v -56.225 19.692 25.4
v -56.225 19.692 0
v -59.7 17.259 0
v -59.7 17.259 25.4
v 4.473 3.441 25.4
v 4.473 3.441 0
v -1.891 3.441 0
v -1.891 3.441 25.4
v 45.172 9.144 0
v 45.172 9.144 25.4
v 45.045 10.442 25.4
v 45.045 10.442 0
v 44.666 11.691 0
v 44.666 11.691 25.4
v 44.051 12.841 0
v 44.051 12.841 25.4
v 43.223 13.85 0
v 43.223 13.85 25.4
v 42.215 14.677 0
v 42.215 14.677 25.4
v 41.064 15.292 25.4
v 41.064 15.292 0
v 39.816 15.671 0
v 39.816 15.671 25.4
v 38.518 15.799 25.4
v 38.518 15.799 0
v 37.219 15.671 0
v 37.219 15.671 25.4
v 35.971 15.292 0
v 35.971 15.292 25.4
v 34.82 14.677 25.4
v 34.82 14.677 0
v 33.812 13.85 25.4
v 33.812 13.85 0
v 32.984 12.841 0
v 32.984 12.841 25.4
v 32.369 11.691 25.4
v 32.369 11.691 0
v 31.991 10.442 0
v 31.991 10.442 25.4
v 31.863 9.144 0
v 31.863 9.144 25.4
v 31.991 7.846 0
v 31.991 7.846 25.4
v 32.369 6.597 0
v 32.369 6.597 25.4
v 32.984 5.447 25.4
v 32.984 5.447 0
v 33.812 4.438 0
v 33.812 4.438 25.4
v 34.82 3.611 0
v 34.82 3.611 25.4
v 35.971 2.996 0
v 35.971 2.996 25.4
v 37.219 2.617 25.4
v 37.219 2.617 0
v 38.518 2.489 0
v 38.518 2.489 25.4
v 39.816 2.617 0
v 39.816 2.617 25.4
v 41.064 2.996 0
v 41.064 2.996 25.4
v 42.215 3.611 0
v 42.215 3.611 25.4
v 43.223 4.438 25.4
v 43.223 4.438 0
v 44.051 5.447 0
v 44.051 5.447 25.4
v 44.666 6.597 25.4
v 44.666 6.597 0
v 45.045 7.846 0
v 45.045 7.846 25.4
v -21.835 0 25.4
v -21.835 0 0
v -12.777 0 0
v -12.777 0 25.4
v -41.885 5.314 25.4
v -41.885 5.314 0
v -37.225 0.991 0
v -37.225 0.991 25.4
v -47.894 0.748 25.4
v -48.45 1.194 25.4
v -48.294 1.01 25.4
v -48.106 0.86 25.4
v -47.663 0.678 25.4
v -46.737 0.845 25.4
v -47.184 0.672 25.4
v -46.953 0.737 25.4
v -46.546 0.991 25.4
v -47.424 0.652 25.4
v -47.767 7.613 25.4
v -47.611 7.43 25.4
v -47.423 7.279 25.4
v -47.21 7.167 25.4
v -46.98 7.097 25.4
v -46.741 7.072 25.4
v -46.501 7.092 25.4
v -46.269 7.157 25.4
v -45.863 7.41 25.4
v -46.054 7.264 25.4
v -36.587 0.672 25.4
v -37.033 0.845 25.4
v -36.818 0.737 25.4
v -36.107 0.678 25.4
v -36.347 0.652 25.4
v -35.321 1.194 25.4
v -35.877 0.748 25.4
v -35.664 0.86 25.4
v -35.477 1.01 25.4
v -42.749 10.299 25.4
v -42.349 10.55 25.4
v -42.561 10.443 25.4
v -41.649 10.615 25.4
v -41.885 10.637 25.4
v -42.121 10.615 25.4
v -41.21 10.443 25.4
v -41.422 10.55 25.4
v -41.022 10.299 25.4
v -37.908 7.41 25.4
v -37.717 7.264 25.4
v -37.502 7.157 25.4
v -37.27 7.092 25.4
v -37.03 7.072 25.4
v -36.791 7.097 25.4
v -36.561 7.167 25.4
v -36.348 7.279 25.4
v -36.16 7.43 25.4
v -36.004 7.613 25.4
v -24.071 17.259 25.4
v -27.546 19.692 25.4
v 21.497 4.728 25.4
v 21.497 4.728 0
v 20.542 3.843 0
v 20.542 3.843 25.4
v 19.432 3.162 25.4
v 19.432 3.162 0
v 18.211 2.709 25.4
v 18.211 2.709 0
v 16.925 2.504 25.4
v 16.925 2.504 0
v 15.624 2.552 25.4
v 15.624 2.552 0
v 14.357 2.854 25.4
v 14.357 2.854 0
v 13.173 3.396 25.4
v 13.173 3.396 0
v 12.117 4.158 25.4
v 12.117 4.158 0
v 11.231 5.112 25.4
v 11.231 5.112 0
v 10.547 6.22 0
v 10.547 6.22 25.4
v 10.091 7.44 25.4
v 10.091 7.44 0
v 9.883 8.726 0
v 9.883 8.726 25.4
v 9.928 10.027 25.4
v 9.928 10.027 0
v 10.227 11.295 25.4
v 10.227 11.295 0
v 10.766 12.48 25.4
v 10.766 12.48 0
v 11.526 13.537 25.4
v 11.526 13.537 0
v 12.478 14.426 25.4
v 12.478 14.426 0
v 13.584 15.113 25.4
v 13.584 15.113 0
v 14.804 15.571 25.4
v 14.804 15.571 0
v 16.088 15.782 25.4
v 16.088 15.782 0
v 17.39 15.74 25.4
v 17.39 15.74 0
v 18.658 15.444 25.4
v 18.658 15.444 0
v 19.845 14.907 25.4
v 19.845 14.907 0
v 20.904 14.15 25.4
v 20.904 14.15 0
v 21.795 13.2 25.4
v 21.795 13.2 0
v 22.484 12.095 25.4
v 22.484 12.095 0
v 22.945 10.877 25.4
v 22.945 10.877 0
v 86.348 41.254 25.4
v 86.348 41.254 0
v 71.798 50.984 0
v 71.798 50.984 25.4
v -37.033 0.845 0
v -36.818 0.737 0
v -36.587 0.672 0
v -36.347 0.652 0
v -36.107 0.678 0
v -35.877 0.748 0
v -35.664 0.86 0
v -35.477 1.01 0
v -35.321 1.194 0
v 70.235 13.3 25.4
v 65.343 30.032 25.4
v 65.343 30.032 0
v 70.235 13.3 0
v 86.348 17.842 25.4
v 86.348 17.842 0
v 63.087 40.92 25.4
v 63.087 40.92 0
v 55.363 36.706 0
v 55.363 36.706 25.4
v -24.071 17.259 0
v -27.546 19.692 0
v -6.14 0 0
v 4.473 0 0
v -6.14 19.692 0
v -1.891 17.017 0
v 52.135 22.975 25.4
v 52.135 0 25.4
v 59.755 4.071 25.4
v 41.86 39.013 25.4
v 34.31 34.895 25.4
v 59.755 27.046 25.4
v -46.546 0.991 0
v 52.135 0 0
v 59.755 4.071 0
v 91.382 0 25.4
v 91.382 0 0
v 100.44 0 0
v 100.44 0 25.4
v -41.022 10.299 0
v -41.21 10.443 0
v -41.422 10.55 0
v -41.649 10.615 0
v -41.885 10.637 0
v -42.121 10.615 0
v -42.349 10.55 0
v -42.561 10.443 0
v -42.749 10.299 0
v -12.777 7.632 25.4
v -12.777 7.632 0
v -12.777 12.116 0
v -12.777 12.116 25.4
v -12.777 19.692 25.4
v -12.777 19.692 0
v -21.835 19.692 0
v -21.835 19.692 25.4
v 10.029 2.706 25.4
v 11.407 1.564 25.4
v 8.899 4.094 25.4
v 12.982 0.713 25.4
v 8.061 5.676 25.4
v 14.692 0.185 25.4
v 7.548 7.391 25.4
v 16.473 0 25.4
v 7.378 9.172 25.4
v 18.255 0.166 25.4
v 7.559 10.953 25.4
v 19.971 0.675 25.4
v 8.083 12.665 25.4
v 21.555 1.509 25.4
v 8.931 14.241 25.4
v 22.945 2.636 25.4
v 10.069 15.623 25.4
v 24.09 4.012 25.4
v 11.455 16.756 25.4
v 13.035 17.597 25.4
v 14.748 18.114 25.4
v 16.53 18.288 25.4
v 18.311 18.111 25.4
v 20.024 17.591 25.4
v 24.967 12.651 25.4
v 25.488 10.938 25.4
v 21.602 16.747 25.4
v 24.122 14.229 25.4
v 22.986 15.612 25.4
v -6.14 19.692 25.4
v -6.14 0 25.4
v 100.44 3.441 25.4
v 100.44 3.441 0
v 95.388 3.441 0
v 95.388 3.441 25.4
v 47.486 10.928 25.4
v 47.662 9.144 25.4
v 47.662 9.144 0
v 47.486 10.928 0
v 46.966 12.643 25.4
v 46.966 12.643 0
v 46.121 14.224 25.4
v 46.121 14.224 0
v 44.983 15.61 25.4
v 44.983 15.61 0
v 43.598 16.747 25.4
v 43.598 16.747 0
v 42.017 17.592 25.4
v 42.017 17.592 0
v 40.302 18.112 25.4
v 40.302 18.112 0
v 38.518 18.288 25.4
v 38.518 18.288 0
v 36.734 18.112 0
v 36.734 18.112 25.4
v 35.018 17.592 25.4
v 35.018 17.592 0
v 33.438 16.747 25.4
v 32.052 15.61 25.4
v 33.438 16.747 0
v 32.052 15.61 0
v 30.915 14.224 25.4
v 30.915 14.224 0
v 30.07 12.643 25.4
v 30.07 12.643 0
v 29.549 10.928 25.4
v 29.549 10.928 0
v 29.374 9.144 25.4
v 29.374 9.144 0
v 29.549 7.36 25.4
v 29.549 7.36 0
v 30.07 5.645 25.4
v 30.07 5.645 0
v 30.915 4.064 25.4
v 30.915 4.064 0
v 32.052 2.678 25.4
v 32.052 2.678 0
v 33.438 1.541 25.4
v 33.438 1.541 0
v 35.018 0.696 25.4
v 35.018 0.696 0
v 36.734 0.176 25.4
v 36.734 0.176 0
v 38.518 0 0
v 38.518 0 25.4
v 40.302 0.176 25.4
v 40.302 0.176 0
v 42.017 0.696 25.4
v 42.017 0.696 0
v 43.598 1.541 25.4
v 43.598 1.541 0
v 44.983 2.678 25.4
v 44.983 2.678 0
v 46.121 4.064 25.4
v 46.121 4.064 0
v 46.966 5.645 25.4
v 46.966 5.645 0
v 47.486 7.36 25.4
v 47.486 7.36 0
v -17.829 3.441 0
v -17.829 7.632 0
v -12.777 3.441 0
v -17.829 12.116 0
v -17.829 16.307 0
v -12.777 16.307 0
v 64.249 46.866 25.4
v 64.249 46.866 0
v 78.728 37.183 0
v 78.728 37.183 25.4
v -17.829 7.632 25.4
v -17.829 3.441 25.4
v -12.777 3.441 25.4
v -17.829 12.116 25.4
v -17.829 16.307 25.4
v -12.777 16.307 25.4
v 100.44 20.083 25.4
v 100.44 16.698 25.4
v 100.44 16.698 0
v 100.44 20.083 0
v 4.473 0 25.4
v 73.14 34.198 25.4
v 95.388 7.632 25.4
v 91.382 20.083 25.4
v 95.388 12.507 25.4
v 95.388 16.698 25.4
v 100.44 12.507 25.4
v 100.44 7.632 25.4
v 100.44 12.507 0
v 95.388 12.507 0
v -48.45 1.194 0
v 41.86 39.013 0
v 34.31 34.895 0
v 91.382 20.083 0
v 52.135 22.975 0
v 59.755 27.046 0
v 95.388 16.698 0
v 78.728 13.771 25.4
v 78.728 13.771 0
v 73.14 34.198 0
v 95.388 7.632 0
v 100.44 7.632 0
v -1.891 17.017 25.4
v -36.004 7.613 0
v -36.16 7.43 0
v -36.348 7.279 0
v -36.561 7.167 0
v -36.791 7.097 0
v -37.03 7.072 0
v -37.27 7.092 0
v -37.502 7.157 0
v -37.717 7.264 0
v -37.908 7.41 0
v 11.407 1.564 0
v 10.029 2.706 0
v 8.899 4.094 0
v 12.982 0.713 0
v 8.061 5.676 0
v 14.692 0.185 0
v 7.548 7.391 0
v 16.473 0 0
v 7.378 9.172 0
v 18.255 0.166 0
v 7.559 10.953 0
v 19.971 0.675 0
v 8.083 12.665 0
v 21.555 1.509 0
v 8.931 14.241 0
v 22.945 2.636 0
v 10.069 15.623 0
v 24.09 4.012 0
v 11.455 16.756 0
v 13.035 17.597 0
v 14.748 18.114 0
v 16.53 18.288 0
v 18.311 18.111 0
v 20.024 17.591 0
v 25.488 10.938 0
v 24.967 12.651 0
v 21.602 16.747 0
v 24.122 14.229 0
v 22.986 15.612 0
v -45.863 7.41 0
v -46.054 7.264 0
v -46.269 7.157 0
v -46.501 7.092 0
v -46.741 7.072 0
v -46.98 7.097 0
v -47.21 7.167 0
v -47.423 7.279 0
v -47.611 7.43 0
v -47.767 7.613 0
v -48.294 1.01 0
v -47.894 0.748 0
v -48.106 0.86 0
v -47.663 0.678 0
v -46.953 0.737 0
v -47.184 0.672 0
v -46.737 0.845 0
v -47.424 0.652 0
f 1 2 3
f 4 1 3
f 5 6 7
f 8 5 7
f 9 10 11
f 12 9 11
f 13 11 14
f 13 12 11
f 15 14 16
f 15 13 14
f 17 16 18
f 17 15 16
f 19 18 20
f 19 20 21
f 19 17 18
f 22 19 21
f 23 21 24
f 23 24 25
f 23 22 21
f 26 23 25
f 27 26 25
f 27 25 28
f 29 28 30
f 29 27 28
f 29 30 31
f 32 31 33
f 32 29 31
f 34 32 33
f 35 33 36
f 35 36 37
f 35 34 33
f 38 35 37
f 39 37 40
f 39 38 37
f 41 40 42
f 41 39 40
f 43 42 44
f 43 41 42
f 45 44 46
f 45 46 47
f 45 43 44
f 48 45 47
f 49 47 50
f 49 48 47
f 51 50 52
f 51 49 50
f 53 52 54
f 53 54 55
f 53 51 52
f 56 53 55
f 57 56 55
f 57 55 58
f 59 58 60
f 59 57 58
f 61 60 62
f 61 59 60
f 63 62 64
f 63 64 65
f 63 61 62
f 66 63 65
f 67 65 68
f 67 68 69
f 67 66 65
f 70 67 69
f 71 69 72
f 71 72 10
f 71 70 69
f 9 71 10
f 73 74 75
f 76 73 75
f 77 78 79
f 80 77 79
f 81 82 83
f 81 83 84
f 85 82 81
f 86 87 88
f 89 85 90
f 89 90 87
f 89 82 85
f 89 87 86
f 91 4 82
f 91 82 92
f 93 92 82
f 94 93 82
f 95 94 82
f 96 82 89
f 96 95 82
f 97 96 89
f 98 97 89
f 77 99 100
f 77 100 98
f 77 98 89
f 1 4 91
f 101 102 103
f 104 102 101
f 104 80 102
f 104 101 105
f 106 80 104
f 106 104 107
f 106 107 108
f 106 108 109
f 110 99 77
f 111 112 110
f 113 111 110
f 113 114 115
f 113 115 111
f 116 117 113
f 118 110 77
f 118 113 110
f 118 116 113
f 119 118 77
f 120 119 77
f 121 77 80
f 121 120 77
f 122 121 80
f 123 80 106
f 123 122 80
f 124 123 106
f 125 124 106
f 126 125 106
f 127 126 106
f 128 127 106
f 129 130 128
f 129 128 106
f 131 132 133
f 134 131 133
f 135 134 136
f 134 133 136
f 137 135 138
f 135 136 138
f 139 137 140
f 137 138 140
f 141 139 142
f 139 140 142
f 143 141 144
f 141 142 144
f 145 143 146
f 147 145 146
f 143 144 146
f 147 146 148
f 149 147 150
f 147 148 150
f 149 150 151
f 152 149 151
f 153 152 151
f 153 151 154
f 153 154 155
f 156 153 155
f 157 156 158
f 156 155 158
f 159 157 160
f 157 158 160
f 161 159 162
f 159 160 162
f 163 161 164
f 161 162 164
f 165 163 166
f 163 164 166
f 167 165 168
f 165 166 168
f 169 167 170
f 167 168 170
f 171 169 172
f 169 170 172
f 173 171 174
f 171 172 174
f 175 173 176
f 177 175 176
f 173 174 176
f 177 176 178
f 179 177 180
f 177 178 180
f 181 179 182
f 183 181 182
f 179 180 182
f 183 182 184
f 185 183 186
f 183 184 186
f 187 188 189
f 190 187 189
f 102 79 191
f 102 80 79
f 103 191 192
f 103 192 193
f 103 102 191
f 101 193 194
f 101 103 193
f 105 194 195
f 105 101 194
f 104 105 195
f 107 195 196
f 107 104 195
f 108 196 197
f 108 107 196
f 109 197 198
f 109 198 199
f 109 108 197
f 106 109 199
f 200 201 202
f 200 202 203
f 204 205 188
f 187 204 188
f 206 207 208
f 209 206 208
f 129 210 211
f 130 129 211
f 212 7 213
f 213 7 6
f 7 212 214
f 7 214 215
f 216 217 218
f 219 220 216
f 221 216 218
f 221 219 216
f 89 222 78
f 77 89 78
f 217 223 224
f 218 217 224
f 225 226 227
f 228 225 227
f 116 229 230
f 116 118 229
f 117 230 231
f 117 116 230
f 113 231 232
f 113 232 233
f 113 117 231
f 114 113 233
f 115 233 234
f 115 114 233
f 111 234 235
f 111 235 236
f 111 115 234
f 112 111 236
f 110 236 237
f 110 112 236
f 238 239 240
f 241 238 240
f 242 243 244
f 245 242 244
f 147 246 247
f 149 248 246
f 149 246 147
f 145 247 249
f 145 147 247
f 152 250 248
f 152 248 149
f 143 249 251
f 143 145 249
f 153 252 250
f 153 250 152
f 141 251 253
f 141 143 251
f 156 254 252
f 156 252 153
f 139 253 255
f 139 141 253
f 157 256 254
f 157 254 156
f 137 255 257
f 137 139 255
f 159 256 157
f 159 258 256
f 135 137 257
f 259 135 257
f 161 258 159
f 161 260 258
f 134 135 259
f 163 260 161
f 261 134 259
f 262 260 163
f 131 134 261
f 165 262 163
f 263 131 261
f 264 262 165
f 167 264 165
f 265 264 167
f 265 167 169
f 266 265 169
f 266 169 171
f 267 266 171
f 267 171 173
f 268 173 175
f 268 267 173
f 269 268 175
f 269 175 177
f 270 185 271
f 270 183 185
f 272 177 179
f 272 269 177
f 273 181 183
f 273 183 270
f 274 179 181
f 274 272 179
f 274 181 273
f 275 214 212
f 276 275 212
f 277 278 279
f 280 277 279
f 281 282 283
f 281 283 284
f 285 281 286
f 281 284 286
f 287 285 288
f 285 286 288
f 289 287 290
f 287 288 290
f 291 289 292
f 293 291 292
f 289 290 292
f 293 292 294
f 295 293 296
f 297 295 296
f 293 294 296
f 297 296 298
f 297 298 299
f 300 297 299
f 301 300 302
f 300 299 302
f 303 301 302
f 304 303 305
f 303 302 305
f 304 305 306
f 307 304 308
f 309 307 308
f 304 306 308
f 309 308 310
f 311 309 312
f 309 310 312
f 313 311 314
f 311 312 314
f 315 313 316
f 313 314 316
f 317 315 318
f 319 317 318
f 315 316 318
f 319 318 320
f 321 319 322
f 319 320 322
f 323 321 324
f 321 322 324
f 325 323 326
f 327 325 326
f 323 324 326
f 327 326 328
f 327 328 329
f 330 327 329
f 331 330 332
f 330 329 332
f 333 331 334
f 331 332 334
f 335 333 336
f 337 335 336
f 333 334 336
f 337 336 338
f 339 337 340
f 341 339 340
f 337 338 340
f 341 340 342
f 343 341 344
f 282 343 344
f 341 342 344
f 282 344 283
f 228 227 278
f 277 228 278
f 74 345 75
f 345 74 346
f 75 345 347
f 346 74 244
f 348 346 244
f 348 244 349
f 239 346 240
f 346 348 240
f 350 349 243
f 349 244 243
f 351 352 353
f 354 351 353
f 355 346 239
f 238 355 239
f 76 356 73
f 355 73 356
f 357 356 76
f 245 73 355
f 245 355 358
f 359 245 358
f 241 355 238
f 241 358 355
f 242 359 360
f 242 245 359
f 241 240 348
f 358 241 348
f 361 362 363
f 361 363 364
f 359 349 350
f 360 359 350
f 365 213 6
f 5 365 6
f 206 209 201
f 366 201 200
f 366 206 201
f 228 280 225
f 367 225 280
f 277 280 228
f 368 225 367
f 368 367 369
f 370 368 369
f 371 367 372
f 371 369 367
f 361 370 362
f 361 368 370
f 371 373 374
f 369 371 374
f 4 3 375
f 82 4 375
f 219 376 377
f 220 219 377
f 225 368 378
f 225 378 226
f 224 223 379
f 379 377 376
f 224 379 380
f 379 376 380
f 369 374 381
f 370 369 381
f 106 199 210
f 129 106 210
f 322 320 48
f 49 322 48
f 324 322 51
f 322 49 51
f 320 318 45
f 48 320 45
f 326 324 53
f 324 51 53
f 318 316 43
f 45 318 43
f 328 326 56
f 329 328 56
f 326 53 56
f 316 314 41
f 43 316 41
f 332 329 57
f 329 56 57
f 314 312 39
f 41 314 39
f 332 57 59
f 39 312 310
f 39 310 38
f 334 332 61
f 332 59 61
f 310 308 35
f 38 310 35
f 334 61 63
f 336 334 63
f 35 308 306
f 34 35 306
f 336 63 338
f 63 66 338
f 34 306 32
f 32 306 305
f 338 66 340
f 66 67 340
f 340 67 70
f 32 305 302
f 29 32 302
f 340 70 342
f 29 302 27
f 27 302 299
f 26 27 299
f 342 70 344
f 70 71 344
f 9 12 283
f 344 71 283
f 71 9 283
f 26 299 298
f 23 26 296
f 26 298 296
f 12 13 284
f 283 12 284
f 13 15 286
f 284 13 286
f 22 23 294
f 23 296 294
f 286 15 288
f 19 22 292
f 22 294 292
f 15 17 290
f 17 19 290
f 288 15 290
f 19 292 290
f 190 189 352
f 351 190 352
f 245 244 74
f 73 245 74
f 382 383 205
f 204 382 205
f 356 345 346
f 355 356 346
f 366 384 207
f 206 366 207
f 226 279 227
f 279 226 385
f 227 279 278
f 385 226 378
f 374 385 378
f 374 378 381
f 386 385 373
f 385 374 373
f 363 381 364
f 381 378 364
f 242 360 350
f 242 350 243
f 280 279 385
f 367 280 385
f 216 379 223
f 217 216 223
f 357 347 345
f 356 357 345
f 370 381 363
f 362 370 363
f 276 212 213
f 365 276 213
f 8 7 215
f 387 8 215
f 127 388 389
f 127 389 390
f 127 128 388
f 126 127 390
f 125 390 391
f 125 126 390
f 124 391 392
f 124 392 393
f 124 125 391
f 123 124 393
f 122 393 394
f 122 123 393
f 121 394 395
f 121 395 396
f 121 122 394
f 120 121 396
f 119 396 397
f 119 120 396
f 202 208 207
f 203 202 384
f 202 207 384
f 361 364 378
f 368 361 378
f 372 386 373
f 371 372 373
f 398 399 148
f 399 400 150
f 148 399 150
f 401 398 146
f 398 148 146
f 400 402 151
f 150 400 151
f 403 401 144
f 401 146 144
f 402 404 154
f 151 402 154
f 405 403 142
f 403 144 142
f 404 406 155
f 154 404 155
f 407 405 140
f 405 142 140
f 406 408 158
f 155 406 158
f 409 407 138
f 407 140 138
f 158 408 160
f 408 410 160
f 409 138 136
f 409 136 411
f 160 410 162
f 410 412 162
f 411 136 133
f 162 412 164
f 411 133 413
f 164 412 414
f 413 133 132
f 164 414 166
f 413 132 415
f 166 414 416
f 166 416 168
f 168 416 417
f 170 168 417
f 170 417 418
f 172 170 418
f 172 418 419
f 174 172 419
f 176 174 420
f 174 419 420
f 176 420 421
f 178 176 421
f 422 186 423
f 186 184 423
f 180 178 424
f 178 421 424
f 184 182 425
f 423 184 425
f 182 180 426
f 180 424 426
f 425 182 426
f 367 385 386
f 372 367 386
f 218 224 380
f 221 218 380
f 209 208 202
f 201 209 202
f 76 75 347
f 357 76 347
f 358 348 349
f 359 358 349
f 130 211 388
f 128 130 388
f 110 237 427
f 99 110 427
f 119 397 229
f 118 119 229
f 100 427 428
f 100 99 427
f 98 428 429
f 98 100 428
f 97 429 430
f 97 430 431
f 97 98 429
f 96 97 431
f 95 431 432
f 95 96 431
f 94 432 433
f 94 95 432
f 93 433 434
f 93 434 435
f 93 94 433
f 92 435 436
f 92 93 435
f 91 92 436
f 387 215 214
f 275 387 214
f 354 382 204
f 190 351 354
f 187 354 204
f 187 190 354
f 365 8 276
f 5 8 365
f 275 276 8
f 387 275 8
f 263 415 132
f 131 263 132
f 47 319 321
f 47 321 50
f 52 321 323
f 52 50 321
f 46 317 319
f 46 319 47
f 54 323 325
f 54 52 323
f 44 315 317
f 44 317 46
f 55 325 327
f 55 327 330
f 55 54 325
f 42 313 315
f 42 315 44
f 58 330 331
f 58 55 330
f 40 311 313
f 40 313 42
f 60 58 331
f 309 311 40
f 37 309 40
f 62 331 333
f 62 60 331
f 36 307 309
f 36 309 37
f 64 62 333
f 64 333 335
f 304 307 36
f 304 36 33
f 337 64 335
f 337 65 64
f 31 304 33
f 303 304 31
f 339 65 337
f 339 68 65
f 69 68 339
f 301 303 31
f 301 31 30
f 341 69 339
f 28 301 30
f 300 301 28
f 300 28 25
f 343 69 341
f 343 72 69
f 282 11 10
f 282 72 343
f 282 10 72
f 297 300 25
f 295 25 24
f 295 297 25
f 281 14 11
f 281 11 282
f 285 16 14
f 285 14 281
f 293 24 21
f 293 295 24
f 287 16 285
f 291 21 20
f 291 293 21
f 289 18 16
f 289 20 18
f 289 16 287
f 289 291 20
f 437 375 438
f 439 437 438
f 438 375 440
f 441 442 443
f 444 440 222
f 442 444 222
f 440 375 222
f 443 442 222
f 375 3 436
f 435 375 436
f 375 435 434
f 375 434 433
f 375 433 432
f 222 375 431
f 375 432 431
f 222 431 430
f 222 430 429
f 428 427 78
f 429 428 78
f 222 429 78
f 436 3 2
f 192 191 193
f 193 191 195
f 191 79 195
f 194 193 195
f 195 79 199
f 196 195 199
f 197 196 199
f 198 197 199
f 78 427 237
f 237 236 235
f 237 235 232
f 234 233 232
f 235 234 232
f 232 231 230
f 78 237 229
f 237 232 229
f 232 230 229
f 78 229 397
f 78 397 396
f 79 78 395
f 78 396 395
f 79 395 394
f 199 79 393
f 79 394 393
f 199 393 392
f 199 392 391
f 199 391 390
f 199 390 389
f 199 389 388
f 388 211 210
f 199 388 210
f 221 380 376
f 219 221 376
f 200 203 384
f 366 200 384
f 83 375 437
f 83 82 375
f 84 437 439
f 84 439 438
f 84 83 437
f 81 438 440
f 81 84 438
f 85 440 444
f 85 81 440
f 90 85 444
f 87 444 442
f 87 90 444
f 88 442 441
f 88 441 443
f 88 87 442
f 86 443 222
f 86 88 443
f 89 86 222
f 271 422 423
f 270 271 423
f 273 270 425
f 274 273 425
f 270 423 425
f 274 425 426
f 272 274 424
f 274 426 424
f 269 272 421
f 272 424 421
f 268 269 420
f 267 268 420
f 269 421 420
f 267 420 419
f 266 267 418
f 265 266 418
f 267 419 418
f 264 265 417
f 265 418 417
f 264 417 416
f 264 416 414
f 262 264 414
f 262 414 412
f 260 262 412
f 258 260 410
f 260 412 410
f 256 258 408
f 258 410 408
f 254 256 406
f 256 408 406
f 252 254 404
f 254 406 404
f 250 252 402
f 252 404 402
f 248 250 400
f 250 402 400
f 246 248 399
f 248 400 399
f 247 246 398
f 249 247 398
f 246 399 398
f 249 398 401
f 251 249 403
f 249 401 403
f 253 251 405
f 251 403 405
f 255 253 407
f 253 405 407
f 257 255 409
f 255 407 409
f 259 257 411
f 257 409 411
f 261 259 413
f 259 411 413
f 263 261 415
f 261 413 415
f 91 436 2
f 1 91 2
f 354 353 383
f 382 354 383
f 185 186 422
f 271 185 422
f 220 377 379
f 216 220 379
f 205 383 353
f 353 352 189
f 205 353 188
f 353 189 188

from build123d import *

# Parameters (mm, degrees)
F0_R     = 9.144
F0_R_2   = 6.6548
F1_DEPTH = 25.4
F2_R     = 1.27


with BuildPart() as f1:
    # F0 (on Top) → F1 (new body)
    with BuildSketch(Plane.XY):
        Polygon((-56.225007, 19.692399), (-59.699686, 17.259402), (-47.614523, 0), (-41.885428, 5.31409), (-36.156334, 0), (-24.07117, 17.259402), (-27.545849, 19.692399), (-36.839665, 6.419454), (-41.885428, 11.099711), (-46.931191, 6.419454), align=None)
        Polygon((-12.777022, 19.692399), (-21.835072, 19.692399), (-21.835072, 0), (-12.777022, 0), (-12.777022, 3.441353), (-17.829043, 3.441353), (-17.829043, 7.632353), (-12.777022, 7.632353), (-12.777022, 12.116344), (-17.829043, 12.116344), (-17.829043, 16.307344), (-12.777022, 16.307344), align=None)
        Polygon((-1.890715, 17.016986), (-6.140463, 19.692399), (-6.140463, 0), (4.472522, 0), (4.472522, 3.441353), (-1.890715, 3.441353), align=None)
        with BuildLine():
            Line((22.944822, 10.877335), (25.488318, 10.938227))
            ThreePointArc((25.488318, 10.938227), (7.558864, 10.953297), (24.090238, 4.012171))
            Line((24.090238, 4.012171), (21.497463, 4.727933))
            ThreePointArc((21.497463, 4.727933), (10.046496, 10.668131), (22.944822, 10.877335))
        make_face()
        with Locations((38.51769, 9.144)):
            Circle(F0_R)
        with Locations((38.51769, 9.144)):
            Circle(F0_R_2, mode=Mode.SUBTRACT)
        Polygon((52.135022, 22.975057), (52.135022, 0), (59.755022, 4.07117), (59.755022, 27.046227), (41.859602, 39.013105), (34.310357, 34.89462), align=None)
        Polygon((63.087319, 40.919948), (55.362636, 36.705753), (65.343022, 30.031752), (70.235036, 13.299606), (73.140104, 34.197533), align=None)
        Polygon((71.797889, 50.984127), (64.248644, 46.865642), (78.728104, 37.183057), (78.728104, 13.770558), (86.348104, 17.841728), (86.348104, 41.254227), align=None)
        Polygon((100.439976, 20.083311), (91.381926, 20.083311), (91.381926, 0), (100.439976, 0), (100.439976, 3.441353), (95.387955, 3.441353), (95.387955, 7.632353), (100.439976, 7.632353), (100.439976, 12.507256), (95.387955, 12.507256), (95.387955, 16.698256), (100.439976, 16.698256), align=None)
    extrude(amount=F1_DEPTH)

    # F2
    f2_edges = [f1.edges().sort_by_distance(p)[0] for p in [
        (-36.156334, 0, 12.7),
        (-47.614523, 0, 12.7),
        (-36.839665, 6.419454, 12.7),
        (-46.931191, 6.419454, 12.7),
        (-41.885428, 11.099711, 12.7),
    ]]
    fillet(f2_edges, radius=F2_R)


solid = f1.part
